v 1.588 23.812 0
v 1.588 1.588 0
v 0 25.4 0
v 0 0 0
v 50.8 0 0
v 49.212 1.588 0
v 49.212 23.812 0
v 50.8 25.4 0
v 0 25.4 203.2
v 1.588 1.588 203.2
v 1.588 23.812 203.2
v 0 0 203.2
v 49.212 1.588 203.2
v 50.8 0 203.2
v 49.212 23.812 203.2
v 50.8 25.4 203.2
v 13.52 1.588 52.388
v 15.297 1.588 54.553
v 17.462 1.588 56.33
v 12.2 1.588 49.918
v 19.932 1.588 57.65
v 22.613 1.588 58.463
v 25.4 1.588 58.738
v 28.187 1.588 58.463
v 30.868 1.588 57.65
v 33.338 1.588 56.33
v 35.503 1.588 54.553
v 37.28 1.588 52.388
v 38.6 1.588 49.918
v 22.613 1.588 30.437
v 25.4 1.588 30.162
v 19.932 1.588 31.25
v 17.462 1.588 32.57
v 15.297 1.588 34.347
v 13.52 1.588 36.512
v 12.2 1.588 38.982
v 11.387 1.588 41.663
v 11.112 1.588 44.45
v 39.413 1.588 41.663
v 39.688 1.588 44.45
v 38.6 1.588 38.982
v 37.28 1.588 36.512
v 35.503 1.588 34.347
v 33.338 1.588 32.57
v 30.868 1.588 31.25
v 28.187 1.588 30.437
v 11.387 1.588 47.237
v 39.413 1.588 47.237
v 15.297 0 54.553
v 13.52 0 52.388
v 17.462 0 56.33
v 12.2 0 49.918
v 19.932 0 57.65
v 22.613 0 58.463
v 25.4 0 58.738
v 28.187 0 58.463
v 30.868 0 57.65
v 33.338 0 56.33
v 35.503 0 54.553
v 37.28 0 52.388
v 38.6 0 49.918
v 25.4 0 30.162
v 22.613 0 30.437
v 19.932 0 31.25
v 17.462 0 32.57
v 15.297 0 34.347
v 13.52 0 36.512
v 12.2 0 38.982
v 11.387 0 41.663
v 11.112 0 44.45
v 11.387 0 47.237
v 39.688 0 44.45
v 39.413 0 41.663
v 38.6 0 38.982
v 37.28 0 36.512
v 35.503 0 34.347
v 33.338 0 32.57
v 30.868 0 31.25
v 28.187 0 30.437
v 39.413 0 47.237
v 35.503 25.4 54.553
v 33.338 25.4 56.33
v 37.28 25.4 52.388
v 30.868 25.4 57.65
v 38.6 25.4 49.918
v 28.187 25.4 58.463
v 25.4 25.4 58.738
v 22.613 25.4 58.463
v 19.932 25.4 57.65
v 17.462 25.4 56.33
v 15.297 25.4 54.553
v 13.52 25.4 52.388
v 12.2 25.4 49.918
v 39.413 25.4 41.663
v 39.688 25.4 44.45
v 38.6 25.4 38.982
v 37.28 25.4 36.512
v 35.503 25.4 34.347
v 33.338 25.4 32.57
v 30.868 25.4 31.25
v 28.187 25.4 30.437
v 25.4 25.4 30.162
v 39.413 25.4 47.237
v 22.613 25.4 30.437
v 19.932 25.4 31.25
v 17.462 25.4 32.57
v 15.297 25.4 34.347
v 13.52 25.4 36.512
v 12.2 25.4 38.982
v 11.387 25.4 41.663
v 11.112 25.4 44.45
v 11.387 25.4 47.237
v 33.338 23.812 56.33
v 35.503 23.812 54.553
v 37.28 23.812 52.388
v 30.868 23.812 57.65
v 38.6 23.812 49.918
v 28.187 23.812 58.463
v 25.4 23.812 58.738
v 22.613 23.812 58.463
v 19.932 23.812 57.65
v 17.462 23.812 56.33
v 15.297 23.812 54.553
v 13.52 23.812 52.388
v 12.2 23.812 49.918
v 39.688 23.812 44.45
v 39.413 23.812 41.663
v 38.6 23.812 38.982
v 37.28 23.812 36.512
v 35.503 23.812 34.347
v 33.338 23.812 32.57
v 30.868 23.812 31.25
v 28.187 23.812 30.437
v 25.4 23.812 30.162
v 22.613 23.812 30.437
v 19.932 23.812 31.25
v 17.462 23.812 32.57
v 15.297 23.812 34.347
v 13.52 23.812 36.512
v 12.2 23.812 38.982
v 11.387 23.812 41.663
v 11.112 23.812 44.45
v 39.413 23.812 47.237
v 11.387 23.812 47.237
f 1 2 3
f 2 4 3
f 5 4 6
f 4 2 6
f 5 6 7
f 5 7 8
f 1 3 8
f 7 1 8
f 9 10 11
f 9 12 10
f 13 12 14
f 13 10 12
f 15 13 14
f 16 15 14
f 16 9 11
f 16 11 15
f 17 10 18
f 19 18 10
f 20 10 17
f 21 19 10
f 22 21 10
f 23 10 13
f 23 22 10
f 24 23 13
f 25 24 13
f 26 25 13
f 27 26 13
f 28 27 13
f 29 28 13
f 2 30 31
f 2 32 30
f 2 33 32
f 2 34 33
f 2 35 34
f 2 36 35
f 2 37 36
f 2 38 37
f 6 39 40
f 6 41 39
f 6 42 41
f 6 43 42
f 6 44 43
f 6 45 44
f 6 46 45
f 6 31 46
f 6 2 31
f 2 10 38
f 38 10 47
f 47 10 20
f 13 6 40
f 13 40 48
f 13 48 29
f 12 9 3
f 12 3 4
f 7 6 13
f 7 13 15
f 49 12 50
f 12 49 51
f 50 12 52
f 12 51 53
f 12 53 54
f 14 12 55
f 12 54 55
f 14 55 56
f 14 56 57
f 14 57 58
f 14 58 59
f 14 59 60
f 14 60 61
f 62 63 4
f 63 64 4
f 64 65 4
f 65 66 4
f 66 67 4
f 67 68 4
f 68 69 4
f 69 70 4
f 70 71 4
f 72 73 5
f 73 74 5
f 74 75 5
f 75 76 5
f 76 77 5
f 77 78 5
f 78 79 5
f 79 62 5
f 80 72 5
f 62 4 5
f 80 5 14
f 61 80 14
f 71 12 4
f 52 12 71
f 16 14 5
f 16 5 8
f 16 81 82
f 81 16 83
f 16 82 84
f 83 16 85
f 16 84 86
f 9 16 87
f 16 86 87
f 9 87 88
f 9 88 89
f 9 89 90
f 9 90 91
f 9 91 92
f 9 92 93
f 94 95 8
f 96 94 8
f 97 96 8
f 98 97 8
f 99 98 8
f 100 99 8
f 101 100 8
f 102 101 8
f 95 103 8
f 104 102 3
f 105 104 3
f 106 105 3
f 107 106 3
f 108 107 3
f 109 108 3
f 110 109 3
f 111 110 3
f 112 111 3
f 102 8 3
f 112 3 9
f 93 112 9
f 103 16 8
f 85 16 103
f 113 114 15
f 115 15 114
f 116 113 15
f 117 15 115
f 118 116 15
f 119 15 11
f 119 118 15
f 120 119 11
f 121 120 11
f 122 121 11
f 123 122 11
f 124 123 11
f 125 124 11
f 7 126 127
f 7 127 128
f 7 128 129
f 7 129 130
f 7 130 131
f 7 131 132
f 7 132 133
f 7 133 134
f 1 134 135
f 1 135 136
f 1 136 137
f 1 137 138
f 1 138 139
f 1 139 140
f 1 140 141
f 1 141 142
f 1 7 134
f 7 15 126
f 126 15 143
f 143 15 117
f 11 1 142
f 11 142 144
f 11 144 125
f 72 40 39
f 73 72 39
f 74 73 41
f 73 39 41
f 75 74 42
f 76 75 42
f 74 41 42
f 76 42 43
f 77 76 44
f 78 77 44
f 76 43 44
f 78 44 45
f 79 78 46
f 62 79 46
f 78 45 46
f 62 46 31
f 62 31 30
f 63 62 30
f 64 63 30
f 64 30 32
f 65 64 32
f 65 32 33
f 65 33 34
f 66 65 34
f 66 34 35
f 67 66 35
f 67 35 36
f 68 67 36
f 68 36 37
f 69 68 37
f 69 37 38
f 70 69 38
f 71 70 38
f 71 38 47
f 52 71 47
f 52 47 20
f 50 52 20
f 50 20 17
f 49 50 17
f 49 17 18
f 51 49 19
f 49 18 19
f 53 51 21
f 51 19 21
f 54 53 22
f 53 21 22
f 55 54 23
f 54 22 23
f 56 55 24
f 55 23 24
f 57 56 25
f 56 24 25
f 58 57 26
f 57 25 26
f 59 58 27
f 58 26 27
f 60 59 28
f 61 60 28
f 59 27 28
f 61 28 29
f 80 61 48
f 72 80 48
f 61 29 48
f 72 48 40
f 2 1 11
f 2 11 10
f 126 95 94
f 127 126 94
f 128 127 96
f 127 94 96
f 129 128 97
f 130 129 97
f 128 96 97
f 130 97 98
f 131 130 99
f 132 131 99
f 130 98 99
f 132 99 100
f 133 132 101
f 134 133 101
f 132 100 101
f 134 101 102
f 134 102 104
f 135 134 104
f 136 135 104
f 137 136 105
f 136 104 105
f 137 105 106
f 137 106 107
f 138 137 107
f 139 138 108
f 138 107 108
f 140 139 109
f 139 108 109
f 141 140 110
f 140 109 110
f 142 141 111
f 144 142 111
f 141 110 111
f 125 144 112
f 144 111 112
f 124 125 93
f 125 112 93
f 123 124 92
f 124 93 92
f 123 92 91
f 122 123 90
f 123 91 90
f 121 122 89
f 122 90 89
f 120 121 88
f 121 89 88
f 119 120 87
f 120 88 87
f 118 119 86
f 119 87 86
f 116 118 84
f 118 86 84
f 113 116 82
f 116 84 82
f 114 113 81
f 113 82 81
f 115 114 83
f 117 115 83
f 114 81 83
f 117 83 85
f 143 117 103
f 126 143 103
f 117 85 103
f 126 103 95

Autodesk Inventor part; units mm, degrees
ref_plane "YZ Plane" through (0, 0, 0) normal (1, 0, 0) x (0, 1, 0)
ref_plane "XZ Plane" through (0, 0, 0) normal (0, 1, 0) x (-1, 0, 0)
ref_plane "XY Plane" through (0, 0, 0) normal (0, 0, 1) x (1, 0, 0)
sketch "Sketch1" plane through (0, 0, 0) normal (0, 0, 1) x (1, 0, 0)
  line L0 (0, 0) -> (50.8, 0)
  line L1 (50.8, 0) -> (50.8, 25.4)
  line L2 (50.8, 25.4) -> (0, 25.4)
  line L3 (0, 25.4) -> (0, 0)
  dimension "d0" = 50.8
  dimension "d1" = 25.4
extrude "Extrusion1" add sketch "Sketch1" along normal blind 203.2
shell "Shell1" thickness 1.5875 removed faces 2 at (16.9333, 8.4667, 0) at (16.9333, 8.4667, 203.2)
sketch "Sketch2" plane through (0, 25.4, 0) normal (0, 1, 0) x (1, 0, 0)
  circle A0 centre (25.4, -44.45) radius 14.2875
  line L0 (0, 0) -> (0, -203.2) projected
  line L1 (50.8, 0) -> (0, 0) projected
  dimension "d5" = 25.4
  dimension "d6" = 44.45
  dimension "d7" = 28.575
extrude "Extrusion2" cut sketch "Sketch2" against normal through all
equation "\"d2\" = Length"
equation "\"Length\" = 203.2"
properties part number "wrist bar boxtube"
